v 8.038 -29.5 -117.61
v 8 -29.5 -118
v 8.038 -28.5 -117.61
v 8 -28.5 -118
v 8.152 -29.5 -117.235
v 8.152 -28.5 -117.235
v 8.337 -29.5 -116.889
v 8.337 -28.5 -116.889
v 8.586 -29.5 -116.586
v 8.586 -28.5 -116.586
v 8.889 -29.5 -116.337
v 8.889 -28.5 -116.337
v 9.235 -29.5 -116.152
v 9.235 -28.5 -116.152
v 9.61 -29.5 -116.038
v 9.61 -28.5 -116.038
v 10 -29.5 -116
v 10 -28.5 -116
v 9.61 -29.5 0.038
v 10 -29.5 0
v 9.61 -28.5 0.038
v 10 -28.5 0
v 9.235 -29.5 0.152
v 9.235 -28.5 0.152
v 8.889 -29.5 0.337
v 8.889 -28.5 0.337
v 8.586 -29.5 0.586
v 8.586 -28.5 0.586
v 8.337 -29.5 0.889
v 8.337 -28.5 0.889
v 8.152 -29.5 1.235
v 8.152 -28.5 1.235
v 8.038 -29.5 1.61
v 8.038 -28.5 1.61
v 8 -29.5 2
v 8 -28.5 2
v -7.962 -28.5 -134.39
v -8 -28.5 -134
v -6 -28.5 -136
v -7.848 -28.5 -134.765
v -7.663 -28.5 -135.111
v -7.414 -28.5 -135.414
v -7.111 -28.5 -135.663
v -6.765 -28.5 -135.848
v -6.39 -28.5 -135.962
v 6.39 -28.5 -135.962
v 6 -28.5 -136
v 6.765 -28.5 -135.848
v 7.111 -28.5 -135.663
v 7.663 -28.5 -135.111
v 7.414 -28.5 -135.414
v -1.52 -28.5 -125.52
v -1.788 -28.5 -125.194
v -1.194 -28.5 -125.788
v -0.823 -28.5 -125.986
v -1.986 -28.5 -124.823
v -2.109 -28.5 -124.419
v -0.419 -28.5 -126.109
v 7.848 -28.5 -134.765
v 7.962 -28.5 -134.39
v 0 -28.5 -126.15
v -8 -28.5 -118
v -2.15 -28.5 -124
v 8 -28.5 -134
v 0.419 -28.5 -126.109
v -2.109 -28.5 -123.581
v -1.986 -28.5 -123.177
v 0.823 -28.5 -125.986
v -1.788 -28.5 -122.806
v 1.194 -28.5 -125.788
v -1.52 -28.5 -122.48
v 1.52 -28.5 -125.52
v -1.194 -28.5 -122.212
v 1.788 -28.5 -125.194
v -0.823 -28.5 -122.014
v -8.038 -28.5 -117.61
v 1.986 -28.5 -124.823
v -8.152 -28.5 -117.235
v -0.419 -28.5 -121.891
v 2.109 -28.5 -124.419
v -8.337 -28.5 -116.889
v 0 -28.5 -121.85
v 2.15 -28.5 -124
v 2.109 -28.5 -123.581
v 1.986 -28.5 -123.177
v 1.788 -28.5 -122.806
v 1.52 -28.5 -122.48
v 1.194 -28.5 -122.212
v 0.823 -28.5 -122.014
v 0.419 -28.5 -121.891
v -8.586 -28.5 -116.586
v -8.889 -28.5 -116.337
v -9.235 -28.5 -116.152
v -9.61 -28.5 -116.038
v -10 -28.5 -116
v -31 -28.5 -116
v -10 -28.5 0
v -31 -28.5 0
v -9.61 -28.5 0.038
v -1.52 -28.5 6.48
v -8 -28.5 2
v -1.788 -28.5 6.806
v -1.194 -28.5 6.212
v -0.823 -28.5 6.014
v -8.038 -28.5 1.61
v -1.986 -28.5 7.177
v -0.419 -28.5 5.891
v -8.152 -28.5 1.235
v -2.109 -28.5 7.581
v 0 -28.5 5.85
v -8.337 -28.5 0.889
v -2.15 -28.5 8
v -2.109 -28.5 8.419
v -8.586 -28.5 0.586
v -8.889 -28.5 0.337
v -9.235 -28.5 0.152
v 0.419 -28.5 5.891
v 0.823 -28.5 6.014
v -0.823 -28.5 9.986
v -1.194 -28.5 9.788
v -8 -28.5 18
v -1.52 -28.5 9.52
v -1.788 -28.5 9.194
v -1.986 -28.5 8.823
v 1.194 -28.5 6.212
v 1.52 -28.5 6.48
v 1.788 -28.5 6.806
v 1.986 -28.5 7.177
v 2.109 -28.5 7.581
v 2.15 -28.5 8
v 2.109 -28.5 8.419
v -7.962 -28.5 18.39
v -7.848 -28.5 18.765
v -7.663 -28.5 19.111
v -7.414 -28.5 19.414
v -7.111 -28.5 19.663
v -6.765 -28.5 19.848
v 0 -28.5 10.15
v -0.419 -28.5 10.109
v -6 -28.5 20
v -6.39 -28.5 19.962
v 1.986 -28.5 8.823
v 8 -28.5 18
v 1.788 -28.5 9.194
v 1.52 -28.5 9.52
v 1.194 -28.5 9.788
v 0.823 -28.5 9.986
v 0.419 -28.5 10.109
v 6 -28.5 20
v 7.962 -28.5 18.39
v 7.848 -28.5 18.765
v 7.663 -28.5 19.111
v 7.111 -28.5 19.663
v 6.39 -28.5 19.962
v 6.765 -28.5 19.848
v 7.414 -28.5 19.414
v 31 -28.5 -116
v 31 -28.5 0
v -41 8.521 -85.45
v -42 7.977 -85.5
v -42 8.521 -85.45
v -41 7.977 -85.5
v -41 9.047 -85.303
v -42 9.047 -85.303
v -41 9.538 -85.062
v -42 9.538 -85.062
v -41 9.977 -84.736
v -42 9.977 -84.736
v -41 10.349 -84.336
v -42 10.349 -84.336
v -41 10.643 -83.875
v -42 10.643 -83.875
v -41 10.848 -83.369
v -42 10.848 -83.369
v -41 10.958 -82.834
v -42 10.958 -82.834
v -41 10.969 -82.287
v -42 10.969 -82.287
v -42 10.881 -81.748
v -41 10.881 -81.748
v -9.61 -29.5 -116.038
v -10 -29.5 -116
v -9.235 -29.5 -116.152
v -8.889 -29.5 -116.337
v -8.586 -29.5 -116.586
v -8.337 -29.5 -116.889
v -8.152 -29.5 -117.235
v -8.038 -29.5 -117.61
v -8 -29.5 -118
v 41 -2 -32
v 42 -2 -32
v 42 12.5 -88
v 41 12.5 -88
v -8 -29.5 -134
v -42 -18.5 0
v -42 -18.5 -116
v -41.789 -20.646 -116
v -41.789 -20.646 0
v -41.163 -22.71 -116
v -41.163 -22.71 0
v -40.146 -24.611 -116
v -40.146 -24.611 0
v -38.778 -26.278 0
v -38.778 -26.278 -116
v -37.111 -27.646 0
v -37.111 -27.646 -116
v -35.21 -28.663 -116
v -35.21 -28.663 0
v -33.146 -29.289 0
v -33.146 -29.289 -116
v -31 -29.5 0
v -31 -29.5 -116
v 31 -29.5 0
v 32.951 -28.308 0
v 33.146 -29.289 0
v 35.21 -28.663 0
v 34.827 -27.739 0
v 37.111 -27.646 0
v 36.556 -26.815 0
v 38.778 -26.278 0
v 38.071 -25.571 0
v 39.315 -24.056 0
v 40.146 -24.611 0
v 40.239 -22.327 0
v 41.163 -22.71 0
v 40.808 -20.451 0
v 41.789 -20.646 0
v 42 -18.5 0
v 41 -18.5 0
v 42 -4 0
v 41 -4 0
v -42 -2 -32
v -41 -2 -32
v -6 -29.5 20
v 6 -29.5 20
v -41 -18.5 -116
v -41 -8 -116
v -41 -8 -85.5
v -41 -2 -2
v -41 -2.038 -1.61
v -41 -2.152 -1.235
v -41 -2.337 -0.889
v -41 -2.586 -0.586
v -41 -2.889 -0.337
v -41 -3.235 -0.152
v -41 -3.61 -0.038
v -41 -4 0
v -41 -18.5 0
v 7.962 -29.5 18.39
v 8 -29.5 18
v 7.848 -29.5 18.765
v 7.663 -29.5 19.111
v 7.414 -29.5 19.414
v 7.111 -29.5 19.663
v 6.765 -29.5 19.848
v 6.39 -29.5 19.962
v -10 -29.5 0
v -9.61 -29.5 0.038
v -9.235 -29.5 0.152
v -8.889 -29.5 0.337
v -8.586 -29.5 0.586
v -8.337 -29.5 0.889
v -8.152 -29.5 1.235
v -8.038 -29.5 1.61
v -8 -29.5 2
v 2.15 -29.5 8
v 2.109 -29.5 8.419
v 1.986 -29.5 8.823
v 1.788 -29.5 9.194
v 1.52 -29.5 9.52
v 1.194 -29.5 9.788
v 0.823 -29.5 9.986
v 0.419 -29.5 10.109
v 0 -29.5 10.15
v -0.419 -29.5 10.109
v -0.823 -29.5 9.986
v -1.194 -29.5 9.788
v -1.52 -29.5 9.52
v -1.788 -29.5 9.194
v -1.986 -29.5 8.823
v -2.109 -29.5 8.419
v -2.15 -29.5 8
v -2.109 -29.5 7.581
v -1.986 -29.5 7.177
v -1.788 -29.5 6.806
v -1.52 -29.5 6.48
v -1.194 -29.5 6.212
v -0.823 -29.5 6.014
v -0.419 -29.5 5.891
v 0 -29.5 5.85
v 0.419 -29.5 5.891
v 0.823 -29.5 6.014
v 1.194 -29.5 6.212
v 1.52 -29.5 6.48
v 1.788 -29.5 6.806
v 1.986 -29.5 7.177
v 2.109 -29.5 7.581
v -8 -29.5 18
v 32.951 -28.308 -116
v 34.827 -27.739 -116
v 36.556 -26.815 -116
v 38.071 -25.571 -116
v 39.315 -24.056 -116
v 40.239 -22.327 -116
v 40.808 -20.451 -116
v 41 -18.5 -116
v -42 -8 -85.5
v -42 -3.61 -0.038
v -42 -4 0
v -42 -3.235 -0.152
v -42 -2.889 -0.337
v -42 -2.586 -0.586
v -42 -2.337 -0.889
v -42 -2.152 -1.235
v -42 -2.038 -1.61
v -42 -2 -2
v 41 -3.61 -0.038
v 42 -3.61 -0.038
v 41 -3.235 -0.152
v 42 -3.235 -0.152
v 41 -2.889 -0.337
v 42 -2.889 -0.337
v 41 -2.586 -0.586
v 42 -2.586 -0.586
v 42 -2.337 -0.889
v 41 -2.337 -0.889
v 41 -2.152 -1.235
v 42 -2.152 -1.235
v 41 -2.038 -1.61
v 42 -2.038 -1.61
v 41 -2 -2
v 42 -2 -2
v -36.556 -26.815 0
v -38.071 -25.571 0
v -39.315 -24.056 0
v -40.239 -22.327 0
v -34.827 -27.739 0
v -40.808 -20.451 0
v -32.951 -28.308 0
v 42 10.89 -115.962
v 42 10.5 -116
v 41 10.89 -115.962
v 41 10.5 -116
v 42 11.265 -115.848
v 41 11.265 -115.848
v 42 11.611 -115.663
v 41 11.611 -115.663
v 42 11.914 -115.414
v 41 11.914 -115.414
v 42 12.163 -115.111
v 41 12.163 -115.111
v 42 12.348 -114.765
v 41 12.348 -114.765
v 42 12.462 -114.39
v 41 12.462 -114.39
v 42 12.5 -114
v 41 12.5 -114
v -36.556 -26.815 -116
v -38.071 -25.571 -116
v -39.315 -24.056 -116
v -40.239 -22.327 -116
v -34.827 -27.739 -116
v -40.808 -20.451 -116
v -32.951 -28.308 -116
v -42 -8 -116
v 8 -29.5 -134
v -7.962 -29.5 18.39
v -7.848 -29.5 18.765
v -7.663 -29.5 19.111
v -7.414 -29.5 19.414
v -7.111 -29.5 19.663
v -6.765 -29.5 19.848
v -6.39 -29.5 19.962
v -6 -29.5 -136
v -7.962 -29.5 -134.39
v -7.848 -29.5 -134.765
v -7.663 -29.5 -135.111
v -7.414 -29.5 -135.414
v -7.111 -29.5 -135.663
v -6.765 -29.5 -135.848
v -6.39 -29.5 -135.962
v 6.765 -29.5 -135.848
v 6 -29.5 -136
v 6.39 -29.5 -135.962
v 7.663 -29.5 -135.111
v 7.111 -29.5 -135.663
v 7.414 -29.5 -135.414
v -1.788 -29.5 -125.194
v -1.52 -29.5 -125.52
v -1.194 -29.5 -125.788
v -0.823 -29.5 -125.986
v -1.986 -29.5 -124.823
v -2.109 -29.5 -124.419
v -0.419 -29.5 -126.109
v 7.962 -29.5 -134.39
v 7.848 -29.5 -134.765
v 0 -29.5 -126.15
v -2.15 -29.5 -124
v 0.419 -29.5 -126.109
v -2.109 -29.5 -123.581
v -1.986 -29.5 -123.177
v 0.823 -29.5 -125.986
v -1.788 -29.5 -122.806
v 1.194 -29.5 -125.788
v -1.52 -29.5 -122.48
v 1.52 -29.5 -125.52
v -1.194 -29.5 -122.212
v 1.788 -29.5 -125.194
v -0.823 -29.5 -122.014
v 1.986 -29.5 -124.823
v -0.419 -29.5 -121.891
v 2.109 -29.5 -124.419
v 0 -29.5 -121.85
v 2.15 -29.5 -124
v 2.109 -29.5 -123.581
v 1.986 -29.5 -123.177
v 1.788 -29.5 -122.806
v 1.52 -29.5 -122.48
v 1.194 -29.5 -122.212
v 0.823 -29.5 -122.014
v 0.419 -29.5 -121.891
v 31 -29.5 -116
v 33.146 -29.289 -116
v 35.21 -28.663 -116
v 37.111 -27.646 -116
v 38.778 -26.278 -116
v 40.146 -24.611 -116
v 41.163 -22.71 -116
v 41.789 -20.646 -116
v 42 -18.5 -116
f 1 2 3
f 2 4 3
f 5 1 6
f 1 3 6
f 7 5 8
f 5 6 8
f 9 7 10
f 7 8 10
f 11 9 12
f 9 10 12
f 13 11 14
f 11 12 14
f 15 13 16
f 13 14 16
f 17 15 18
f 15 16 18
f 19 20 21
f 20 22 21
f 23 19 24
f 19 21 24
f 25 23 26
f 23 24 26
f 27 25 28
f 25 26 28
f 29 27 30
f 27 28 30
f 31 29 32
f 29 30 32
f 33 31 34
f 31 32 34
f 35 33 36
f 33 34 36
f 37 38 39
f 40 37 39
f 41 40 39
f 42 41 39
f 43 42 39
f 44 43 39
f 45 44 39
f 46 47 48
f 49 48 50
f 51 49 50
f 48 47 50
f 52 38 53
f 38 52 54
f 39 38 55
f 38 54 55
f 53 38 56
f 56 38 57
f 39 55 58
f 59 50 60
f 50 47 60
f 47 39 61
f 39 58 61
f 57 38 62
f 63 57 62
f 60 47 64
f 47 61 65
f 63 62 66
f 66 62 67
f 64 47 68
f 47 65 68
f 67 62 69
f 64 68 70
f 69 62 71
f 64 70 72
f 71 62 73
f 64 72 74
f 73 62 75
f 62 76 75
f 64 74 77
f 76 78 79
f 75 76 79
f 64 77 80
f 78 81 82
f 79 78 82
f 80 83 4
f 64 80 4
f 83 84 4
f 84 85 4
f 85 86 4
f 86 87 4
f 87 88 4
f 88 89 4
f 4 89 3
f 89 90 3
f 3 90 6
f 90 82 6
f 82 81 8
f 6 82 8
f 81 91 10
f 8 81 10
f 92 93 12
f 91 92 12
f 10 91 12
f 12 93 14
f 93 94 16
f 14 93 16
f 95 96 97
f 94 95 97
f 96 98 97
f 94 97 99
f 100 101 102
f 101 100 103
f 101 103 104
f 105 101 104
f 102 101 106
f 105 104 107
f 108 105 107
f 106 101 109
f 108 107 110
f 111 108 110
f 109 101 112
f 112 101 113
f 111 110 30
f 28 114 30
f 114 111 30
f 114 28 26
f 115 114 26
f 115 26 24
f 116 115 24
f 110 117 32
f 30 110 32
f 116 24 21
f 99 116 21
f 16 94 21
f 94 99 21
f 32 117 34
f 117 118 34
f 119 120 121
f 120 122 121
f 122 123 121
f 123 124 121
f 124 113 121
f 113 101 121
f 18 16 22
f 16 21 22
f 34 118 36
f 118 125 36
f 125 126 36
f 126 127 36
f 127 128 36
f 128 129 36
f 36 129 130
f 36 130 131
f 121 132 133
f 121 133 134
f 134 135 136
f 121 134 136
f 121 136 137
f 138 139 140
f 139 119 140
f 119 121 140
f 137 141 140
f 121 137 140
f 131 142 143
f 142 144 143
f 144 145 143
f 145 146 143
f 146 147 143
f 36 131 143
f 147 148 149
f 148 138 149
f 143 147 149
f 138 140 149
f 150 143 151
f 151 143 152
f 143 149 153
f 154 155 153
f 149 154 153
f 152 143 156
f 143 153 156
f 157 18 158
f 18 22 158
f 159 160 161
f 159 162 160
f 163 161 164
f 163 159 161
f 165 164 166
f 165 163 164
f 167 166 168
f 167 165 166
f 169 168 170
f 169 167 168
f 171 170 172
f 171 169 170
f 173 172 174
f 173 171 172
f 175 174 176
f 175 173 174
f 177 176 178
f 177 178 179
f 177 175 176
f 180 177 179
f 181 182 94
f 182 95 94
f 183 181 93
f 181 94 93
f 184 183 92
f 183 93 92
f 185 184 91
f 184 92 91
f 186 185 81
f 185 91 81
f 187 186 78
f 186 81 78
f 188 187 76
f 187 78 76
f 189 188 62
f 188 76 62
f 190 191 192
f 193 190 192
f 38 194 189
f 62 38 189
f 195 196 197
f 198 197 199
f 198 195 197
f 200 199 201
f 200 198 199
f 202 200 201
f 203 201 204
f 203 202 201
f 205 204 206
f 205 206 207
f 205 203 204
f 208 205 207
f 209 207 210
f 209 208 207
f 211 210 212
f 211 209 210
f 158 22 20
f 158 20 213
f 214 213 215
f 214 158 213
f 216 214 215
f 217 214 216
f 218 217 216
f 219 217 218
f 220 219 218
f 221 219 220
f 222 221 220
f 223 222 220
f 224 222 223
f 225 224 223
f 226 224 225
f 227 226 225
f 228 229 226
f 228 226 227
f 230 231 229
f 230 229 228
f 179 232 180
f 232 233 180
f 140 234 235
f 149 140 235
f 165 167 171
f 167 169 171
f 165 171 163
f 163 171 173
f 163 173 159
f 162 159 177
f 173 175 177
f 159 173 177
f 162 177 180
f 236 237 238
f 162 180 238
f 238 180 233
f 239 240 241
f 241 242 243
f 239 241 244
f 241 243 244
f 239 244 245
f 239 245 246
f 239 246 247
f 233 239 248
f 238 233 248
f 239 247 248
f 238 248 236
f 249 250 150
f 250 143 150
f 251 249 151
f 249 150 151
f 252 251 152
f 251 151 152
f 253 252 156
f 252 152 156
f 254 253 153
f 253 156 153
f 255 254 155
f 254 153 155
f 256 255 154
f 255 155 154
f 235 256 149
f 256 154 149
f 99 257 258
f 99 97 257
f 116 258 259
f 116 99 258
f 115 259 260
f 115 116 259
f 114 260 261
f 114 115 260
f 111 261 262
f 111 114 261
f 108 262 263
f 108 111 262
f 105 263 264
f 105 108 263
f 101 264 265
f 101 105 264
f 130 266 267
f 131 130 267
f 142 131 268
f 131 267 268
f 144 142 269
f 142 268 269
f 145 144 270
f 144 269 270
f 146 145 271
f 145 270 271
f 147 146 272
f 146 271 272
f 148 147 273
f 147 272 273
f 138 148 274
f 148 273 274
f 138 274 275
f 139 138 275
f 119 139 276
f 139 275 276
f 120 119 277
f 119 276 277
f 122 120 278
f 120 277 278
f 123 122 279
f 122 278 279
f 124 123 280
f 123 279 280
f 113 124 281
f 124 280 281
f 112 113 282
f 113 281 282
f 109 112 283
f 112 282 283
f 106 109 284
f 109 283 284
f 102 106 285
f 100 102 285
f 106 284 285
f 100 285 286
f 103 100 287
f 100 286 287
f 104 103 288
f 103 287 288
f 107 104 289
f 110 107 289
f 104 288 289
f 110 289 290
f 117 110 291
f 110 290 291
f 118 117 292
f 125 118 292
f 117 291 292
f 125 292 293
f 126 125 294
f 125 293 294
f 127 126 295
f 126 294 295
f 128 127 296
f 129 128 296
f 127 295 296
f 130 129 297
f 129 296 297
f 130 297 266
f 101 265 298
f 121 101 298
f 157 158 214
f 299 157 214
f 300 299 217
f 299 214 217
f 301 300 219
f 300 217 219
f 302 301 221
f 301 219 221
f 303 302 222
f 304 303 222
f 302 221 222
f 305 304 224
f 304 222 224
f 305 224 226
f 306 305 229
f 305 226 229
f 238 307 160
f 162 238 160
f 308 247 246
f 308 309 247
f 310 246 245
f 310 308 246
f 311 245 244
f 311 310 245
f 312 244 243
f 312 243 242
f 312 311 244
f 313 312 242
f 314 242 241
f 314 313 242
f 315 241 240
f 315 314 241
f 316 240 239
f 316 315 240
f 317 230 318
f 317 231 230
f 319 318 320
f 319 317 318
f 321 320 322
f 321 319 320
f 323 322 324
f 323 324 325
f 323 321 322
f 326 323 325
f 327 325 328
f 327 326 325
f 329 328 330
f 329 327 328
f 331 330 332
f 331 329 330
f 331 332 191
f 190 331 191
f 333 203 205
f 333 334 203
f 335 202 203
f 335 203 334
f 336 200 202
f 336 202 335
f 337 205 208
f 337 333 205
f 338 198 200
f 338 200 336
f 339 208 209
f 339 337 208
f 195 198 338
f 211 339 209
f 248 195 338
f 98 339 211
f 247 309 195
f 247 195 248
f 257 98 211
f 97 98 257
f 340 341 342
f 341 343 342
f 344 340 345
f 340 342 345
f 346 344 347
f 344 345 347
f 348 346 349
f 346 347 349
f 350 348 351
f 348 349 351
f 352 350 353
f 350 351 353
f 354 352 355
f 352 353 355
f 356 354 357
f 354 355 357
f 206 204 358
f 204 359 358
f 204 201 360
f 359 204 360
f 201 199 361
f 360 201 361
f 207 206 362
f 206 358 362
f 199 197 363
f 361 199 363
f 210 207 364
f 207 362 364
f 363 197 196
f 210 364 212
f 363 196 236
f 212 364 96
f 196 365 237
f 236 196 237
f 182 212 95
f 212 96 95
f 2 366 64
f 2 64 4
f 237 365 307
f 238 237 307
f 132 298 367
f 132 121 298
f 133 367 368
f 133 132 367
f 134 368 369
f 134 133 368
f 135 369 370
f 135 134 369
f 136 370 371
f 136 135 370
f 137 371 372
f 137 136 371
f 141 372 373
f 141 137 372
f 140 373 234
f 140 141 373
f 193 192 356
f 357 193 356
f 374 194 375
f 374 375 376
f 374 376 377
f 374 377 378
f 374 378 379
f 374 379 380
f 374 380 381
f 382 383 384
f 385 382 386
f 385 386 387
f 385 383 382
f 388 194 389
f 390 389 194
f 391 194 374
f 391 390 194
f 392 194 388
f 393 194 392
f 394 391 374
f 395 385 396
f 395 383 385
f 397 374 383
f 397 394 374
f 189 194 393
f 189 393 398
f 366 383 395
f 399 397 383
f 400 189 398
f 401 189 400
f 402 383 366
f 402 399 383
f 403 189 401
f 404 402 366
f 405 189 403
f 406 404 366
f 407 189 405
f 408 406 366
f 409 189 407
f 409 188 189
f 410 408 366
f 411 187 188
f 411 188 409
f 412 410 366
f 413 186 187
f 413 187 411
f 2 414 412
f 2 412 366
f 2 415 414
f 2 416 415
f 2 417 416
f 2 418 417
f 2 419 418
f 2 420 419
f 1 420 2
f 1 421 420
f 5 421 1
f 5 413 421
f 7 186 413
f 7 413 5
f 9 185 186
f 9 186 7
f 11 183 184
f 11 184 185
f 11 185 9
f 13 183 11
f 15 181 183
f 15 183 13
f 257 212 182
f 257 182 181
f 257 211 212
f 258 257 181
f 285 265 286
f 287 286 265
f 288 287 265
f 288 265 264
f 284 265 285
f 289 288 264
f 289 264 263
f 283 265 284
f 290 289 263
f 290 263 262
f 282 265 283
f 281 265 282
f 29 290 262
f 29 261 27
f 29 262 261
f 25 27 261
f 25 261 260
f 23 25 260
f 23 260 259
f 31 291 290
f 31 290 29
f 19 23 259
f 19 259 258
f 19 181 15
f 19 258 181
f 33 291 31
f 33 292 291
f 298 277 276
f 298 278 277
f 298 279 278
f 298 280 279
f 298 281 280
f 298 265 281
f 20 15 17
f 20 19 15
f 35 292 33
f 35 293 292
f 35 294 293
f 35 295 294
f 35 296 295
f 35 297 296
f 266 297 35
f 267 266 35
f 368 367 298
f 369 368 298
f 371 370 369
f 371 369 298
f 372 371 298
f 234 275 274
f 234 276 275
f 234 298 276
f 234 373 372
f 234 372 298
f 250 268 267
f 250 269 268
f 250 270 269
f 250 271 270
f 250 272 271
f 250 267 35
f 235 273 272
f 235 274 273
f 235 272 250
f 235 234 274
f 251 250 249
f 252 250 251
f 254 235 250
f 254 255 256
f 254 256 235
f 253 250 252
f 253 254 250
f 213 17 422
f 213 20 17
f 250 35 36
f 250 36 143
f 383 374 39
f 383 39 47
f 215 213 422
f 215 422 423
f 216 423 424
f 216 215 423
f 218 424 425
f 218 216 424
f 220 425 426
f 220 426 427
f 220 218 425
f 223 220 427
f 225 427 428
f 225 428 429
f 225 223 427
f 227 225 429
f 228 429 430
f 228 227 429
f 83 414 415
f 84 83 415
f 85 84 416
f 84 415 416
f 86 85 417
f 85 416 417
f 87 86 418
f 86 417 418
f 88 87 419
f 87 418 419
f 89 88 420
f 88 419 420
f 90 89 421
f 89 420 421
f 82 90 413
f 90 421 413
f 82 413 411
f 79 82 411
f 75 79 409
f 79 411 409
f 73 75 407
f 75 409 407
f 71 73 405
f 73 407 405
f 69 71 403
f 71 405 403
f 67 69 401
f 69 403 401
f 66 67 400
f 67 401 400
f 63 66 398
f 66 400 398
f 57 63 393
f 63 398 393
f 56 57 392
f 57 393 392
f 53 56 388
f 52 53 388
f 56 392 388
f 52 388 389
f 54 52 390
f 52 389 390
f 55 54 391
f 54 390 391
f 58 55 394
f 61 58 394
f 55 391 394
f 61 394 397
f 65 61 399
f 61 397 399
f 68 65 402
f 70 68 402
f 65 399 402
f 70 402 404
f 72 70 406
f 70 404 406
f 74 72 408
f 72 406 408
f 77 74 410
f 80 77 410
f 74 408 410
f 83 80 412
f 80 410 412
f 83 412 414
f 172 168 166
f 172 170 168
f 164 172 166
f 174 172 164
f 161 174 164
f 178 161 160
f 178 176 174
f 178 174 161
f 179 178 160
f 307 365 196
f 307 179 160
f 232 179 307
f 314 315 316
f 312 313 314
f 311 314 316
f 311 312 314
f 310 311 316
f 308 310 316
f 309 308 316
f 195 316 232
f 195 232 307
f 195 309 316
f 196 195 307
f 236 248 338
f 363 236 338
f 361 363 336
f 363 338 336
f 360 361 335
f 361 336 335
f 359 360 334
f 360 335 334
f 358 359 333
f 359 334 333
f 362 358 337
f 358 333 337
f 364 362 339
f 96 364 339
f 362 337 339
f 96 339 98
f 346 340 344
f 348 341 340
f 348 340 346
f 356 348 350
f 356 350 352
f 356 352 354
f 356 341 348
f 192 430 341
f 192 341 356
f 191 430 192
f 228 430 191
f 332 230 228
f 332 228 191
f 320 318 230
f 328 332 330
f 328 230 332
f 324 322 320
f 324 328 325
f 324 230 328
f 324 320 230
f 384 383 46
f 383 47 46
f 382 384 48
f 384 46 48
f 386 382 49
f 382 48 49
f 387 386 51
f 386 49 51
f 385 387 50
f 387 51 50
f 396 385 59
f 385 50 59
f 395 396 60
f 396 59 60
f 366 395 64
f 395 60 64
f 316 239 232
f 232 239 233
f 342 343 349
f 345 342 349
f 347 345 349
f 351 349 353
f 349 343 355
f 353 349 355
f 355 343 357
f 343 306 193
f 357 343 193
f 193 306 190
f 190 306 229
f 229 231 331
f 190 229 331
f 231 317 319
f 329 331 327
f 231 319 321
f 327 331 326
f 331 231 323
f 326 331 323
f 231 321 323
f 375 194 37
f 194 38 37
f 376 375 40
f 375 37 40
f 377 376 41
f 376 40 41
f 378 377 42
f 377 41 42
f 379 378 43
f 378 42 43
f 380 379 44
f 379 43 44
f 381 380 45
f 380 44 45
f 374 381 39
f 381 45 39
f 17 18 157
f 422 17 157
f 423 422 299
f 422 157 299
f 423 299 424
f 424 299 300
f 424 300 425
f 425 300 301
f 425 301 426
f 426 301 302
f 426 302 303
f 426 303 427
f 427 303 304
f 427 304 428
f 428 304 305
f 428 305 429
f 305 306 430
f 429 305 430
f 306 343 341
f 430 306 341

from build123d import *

# Parameters (mm, degrees)
BOSS_EXTRUDE1_DEPTH = 116
SKETCH2_W           = 16
SKETCH2_H           = 20
BOSS_EXTRUDE2_DEPTH = 1
CUT_EXTRUDE1_DEPTH  = 163.549223314
FILLET1_R           = 2
CUT_EXTRUDE2_DEPTH  = 1
FILLET2_R           = 3
SKETCH6_R           = 2.15
CUT_EXTRUDE3_DEPTH  = 1


with BuildPart() as part:
    # Sketch1 → Boss-Extrude1 (new body)
    with BuildSketch(Plane.XY):
        with BuildLine():
            Line((-42, 18.5), (-42, -18.5))
            ThreePointArc((-42, -18.5), (-38.778174593, -26.278174593), (-31, -29.5))
            Line((-31, -29.5), (31, -29.5))
            ThreePointArc((31, -29.5), (38.778174593, -26.278174593), (42, -18.5))
            Line((42, -18.5), (42, 18.5))
            ThreePointArc((42, 18.5), (38.778174593, 26.278174593), (31, 29.5))
            Line((31, 29.5), (-31, 29.5))
            ThreePointArc((-31, 29.5), (-38.778174593, 26.278174593), (-42, 18.5))
        make_face()
        with BuildLine():
            ThreePointArc((-31, 28.5), (-38.071067812, 25.571067812), (-41, 18.5))
            Line((-41, 18.5), (-41, -18.5))
            ThreePointArc((-41, -18.5), (-38.071067812, -25.571067812), (-31, -28.5))
            Line((-31, -28.5), (31, -28.5))
            ThreePointArc((31, -28.5), (38.071067812, -25.571067812), (41, -18.5))
            Line((41, -18.5), (41, 18.5))
            ThreePointArc((41, 18.5), (38.071067812, 25.571067812), (31, 28.5))
            Line((31, 28.5), (-31, 28.5))
        make_face(mode=Mode.SUBTRACT)
    extrude(amount=-BOSS_EXTRUDE1_DEPTH)

    # Sketch2 → Boss-Extrude2 (add)
    with BuildSketch(Plane.XZ.offset(29.5)):
        with Locations((0, 10)):
            Rectangle(SKETCH2_W, SKETCH2_H)
        with Locations((0, -126)):
            Rectangle(SKETCH2_W, SKETCH2_H)
    extrude(amount=-BOSS_EXTRUDE2_DEPTH)

    # Sketch3 → Cut-Extrude1 (cut, through all)
    with BuildSketch(Plane(origin=(42, 0, 0), x_dir=(0, 0, -1), z_dir=(1, 0, 0))):
        Polygon((0, -2), (32, -2), (88, 12.5), (116, 12.5), (116, 29.5), (0, 29.5), align=None)
    extrude(amount=-CUT_EXTRUDE1_DEPTH, mode=Mode.SUBTRACT)

    # Fillet1
    fillet1_edges = [part.edges().sort_by_distance(p)[0] for p in [
        (8, -29, 20),
        (8, -29, 0),
        (-8, -29, 0),
        (-8, -29, 20),
        (-8, -29, -136),
        (-8, -29, -116),
        (8, -29, -116),
        (8, -29, -136),
        (41.5, -2, 0),
        (-41.5, 12.5, -116),
        (41.5, 12.5, -116),
        (-41.5, -2, 0),
    ]]
    fillet(fillet1_edges, radius=FILLET1_R)

    # Sketch5 → Cut-Extrude2 (cut)
    with BuildSketch(Plane.ZY.offset(42)):
        with BuildLine():
            Line((-113, -8), (-113, 12.5))
            Line((-113, 12.5), (-114, 12.5))
            ThreePointArc((-114, 12.5), (-115.414213562, 11.914213562), (-116, 10.5))
            Line((-116, 10.5), (-116, -8))
            Line((-116, -8), (-113, -8))
        make_face()
        Polygon((-88, 12.5), (-113, 12.5), (-113, -8), (-85.5, -8), (-85.5, 11.852678571), align=None)
    extrude(amount=-CUT_EXTRUDE2_DEPTH, mode=Mode.SUBTRACT)

    # Fillet2
    fillet2_edges = [part.edges().sort_by_distance(p)[0] for p in [
        (-41.5, 11.852678571, -85.5),
    ]]
    fillet(fillet2_edges, radius=FILLET2_R)

    # Sketch6 → Cut-Extrude3 (cut)
    with BuildSketch(Plane.XZ.offset(29.5)):
        with Locations((0, -124)):
            Circle(SKETCH6_R)
        with Locations((0, 8)):
            Circle(SKETCH6_R)
    extrude(amount=-CUT_EXTRUDE3_DEPTH, mode=Mode.SUBTRACT)


solid = part.part
